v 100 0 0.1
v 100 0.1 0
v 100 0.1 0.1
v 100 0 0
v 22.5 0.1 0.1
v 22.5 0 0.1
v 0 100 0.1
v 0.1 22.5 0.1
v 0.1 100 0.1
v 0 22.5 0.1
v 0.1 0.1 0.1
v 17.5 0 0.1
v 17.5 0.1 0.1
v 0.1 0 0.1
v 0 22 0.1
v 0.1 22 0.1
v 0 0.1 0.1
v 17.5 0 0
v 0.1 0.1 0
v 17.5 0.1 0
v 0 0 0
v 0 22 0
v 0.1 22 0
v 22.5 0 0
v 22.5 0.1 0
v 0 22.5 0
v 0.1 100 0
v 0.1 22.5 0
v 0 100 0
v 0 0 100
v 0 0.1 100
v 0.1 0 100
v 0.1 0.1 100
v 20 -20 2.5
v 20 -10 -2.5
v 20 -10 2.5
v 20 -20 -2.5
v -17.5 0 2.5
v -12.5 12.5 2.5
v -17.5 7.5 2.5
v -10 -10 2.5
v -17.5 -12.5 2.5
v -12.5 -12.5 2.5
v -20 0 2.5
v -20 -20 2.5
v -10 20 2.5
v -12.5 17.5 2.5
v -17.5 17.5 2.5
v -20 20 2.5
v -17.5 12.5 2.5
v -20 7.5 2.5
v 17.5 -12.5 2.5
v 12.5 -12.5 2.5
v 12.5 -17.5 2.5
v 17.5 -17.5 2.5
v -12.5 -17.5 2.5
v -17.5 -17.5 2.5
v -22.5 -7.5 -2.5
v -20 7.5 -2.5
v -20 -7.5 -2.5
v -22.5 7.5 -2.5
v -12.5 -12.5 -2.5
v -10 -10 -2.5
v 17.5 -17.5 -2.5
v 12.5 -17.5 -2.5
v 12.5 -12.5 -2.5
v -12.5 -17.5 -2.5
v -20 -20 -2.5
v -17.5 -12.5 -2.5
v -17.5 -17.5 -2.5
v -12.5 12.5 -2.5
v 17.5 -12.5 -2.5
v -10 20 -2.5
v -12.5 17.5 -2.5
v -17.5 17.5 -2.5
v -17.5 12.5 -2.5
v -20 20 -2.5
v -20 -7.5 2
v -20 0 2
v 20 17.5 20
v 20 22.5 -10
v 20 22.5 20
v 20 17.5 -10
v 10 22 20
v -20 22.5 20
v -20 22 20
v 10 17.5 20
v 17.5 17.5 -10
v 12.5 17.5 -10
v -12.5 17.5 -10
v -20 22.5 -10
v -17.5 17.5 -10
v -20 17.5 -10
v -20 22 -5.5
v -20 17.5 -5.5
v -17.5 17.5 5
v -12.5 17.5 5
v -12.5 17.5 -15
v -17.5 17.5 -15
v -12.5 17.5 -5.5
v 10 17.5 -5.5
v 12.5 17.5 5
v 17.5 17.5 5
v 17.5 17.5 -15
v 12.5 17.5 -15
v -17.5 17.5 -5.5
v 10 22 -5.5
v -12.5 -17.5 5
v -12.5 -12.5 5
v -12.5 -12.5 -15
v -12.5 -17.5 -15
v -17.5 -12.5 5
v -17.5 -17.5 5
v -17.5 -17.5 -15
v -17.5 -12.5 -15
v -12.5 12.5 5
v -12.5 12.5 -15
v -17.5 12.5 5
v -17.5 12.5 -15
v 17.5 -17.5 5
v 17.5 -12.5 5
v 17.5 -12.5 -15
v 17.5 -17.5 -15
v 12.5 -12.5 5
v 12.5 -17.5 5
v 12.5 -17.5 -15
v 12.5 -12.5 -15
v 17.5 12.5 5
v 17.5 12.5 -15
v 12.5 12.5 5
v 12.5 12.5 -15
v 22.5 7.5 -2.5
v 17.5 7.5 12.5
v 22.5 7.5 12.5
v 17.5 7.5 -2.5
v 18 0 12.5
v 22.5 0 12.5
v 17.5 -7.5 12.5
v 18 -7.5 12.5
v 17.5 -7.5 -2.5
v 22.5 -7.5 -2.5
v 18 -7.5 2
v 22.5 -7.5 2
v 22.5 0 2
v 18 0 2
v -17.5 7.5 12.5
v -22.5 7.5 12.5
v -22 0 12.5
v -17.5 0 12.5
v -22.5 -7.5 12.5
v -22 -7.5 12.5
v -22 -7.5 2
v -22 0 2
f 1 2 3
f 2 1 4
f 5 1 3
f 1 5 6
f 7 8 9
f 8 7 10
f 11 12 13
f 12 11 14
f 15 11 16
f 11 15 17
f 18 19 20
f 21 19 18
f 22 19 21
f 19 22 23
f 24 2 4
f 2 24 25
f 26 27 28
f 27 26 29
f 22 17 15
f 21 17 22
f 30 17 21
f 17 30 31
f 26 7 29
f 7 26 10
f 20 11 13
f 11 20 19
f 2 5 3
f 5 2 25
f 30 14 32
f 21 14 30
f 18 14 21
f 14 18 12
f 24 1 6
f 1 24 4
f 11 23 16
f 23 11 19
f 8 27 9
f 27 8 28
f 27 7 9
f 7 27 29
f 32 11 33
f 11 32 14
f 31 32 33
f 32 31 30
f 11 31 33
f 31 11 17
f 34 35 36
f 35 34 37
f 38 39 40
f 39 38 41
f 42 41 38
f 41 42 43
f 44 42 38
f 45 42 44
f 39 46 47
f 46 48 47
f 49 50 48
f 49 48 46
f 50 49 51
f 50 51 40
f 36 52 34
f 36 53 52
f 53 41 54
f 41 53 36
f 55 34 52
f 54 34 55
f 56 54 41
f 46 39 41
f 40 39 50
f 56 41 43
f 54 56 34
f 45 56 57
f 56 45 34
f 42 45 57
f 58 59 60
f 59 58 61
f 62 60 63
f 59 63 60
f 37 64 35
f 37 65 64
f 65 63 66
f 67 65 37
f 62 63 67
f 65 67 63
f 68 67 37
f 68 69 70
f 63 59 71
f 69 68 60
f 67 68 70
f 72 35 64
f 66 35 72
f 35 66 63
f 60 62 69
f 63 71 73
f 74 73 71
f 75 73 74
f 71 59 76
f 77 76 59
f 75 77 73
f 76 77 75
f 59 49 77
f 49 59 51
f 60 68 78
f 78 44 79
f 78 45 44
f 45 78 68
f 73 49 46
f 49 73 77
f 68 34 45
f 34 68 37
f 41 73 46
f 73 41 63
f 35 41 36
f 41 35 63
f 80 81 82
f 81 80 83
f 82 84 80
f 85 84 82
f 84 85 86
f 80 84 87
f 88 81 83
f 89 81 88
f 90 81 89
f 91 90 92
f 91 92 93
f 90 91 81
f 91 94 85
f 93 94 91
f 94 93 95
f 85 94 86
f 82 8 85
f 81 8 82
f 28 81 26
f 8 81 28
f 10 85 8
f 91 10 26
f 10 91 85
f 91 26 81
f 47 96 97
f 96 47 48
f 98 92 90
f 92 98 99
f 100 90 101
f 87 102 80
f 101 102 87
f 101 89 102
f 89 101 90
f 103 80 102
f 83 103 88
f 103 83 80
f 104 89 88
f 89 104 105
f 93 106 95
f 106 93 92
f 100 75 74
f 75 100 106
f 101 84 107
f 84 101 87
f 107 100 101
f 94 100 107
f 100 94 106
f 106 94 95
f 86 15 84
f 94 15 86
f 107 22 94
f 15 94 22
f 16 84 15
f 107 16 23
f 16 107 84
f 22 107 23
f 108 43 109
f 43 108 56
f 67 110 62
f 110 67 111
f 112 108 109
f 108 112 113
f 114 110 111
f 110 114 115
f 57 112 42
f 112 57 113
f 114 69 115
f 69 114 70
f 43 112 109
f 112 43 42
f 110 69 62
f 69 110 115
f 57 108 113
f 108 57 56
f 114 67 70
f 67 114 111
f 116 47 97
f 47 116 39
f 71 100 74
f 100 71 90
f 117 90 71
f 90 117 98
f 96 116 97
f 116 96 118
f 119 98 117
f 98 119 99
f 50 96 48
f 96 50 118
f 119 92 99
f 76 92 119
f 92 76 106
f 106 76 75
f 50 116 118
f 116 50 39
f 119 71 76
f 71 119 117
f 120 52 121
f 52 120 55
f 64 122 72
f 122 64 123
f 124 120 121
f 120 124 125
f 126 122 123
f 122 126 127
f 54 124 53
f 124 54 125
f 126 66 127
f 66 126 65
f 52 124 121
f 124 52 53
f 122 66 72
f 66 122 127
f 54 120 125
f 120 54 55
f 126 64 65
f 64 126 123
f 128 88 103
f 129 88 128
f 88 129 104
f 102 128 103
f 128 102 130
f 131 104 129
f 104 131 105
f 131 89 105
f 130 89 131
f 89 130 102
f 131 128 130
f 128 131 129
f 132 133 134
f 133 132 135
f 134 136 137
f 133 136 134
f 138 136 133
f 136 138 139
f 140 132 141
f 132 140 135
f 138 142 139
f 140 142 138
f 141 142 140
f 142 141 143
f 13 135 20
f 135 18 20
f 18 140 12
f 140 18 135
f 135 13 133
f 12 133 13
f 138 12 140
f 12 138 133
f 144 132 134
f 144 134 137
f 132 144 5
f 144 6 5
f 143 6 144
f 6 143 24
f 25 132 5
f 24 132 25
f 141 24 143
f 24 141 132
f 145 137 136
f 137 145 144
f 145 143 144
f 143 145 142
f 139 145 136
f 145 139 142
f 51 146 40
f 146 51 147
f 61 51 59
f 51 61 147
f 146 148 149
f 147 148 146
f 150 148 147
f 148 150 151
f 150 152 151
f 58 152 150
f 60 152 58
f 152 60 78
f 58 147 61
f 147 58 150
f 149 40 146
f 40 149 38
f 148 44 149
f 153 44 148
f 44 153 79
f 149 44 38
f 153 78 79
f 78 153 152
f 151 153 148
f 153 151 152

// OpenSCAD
    // Combined Scene

    // Permanent Model
    
    // Permanent Model (Black)
    color([0, 0, 0]) {
        // Your permanent model code here
        cube([100,0.1,0.1], center = false);
        cube([0.1,100,0.1], center = false);
        cube([0.1,0.1,100], center = false);
    }
    

    // Dynamic Model
    translate([0, 0, 0]) {
    // Seat
    difference() {
        cube([40, 40, 5], center=true);
        translate([5, 5, -0.5])
            cube([30, 30, 6], center=true);
    }

    // Backrest
    translate([0, 20, 5]) {
        difference() {
            cube([40, 5, 30], center=true);
            translate([-5, -0.5, 5])
                cube([30, 5, 31], center=true);
        }
    }

    // Legs
    for (x = [-15, 15]) {
        for (y = [-15, 15]) {
            translate([x, y, -5]) {
                cube([5, 5, 20], center=true);
            }
        }
    }

    // Armrests
    translate([20, 0, 5]) {
        rotate([0, 0, 90]) {
            difference() {
                cube([15, 5, 15], center=true);
                translate([-5, -0.5, 5])
                    cube([10, 5, 16], center=true);
            }
        }
    }
    translate([-20, 0, 5]) {
        rotate([0, 0, 90]) {
            difference() {
                cube([15, 5, 15], center=true);
                translate([-5, -0.5, 5])
                    cube([10, 5, 16], center=true);
            }
        }
    }
}
    
